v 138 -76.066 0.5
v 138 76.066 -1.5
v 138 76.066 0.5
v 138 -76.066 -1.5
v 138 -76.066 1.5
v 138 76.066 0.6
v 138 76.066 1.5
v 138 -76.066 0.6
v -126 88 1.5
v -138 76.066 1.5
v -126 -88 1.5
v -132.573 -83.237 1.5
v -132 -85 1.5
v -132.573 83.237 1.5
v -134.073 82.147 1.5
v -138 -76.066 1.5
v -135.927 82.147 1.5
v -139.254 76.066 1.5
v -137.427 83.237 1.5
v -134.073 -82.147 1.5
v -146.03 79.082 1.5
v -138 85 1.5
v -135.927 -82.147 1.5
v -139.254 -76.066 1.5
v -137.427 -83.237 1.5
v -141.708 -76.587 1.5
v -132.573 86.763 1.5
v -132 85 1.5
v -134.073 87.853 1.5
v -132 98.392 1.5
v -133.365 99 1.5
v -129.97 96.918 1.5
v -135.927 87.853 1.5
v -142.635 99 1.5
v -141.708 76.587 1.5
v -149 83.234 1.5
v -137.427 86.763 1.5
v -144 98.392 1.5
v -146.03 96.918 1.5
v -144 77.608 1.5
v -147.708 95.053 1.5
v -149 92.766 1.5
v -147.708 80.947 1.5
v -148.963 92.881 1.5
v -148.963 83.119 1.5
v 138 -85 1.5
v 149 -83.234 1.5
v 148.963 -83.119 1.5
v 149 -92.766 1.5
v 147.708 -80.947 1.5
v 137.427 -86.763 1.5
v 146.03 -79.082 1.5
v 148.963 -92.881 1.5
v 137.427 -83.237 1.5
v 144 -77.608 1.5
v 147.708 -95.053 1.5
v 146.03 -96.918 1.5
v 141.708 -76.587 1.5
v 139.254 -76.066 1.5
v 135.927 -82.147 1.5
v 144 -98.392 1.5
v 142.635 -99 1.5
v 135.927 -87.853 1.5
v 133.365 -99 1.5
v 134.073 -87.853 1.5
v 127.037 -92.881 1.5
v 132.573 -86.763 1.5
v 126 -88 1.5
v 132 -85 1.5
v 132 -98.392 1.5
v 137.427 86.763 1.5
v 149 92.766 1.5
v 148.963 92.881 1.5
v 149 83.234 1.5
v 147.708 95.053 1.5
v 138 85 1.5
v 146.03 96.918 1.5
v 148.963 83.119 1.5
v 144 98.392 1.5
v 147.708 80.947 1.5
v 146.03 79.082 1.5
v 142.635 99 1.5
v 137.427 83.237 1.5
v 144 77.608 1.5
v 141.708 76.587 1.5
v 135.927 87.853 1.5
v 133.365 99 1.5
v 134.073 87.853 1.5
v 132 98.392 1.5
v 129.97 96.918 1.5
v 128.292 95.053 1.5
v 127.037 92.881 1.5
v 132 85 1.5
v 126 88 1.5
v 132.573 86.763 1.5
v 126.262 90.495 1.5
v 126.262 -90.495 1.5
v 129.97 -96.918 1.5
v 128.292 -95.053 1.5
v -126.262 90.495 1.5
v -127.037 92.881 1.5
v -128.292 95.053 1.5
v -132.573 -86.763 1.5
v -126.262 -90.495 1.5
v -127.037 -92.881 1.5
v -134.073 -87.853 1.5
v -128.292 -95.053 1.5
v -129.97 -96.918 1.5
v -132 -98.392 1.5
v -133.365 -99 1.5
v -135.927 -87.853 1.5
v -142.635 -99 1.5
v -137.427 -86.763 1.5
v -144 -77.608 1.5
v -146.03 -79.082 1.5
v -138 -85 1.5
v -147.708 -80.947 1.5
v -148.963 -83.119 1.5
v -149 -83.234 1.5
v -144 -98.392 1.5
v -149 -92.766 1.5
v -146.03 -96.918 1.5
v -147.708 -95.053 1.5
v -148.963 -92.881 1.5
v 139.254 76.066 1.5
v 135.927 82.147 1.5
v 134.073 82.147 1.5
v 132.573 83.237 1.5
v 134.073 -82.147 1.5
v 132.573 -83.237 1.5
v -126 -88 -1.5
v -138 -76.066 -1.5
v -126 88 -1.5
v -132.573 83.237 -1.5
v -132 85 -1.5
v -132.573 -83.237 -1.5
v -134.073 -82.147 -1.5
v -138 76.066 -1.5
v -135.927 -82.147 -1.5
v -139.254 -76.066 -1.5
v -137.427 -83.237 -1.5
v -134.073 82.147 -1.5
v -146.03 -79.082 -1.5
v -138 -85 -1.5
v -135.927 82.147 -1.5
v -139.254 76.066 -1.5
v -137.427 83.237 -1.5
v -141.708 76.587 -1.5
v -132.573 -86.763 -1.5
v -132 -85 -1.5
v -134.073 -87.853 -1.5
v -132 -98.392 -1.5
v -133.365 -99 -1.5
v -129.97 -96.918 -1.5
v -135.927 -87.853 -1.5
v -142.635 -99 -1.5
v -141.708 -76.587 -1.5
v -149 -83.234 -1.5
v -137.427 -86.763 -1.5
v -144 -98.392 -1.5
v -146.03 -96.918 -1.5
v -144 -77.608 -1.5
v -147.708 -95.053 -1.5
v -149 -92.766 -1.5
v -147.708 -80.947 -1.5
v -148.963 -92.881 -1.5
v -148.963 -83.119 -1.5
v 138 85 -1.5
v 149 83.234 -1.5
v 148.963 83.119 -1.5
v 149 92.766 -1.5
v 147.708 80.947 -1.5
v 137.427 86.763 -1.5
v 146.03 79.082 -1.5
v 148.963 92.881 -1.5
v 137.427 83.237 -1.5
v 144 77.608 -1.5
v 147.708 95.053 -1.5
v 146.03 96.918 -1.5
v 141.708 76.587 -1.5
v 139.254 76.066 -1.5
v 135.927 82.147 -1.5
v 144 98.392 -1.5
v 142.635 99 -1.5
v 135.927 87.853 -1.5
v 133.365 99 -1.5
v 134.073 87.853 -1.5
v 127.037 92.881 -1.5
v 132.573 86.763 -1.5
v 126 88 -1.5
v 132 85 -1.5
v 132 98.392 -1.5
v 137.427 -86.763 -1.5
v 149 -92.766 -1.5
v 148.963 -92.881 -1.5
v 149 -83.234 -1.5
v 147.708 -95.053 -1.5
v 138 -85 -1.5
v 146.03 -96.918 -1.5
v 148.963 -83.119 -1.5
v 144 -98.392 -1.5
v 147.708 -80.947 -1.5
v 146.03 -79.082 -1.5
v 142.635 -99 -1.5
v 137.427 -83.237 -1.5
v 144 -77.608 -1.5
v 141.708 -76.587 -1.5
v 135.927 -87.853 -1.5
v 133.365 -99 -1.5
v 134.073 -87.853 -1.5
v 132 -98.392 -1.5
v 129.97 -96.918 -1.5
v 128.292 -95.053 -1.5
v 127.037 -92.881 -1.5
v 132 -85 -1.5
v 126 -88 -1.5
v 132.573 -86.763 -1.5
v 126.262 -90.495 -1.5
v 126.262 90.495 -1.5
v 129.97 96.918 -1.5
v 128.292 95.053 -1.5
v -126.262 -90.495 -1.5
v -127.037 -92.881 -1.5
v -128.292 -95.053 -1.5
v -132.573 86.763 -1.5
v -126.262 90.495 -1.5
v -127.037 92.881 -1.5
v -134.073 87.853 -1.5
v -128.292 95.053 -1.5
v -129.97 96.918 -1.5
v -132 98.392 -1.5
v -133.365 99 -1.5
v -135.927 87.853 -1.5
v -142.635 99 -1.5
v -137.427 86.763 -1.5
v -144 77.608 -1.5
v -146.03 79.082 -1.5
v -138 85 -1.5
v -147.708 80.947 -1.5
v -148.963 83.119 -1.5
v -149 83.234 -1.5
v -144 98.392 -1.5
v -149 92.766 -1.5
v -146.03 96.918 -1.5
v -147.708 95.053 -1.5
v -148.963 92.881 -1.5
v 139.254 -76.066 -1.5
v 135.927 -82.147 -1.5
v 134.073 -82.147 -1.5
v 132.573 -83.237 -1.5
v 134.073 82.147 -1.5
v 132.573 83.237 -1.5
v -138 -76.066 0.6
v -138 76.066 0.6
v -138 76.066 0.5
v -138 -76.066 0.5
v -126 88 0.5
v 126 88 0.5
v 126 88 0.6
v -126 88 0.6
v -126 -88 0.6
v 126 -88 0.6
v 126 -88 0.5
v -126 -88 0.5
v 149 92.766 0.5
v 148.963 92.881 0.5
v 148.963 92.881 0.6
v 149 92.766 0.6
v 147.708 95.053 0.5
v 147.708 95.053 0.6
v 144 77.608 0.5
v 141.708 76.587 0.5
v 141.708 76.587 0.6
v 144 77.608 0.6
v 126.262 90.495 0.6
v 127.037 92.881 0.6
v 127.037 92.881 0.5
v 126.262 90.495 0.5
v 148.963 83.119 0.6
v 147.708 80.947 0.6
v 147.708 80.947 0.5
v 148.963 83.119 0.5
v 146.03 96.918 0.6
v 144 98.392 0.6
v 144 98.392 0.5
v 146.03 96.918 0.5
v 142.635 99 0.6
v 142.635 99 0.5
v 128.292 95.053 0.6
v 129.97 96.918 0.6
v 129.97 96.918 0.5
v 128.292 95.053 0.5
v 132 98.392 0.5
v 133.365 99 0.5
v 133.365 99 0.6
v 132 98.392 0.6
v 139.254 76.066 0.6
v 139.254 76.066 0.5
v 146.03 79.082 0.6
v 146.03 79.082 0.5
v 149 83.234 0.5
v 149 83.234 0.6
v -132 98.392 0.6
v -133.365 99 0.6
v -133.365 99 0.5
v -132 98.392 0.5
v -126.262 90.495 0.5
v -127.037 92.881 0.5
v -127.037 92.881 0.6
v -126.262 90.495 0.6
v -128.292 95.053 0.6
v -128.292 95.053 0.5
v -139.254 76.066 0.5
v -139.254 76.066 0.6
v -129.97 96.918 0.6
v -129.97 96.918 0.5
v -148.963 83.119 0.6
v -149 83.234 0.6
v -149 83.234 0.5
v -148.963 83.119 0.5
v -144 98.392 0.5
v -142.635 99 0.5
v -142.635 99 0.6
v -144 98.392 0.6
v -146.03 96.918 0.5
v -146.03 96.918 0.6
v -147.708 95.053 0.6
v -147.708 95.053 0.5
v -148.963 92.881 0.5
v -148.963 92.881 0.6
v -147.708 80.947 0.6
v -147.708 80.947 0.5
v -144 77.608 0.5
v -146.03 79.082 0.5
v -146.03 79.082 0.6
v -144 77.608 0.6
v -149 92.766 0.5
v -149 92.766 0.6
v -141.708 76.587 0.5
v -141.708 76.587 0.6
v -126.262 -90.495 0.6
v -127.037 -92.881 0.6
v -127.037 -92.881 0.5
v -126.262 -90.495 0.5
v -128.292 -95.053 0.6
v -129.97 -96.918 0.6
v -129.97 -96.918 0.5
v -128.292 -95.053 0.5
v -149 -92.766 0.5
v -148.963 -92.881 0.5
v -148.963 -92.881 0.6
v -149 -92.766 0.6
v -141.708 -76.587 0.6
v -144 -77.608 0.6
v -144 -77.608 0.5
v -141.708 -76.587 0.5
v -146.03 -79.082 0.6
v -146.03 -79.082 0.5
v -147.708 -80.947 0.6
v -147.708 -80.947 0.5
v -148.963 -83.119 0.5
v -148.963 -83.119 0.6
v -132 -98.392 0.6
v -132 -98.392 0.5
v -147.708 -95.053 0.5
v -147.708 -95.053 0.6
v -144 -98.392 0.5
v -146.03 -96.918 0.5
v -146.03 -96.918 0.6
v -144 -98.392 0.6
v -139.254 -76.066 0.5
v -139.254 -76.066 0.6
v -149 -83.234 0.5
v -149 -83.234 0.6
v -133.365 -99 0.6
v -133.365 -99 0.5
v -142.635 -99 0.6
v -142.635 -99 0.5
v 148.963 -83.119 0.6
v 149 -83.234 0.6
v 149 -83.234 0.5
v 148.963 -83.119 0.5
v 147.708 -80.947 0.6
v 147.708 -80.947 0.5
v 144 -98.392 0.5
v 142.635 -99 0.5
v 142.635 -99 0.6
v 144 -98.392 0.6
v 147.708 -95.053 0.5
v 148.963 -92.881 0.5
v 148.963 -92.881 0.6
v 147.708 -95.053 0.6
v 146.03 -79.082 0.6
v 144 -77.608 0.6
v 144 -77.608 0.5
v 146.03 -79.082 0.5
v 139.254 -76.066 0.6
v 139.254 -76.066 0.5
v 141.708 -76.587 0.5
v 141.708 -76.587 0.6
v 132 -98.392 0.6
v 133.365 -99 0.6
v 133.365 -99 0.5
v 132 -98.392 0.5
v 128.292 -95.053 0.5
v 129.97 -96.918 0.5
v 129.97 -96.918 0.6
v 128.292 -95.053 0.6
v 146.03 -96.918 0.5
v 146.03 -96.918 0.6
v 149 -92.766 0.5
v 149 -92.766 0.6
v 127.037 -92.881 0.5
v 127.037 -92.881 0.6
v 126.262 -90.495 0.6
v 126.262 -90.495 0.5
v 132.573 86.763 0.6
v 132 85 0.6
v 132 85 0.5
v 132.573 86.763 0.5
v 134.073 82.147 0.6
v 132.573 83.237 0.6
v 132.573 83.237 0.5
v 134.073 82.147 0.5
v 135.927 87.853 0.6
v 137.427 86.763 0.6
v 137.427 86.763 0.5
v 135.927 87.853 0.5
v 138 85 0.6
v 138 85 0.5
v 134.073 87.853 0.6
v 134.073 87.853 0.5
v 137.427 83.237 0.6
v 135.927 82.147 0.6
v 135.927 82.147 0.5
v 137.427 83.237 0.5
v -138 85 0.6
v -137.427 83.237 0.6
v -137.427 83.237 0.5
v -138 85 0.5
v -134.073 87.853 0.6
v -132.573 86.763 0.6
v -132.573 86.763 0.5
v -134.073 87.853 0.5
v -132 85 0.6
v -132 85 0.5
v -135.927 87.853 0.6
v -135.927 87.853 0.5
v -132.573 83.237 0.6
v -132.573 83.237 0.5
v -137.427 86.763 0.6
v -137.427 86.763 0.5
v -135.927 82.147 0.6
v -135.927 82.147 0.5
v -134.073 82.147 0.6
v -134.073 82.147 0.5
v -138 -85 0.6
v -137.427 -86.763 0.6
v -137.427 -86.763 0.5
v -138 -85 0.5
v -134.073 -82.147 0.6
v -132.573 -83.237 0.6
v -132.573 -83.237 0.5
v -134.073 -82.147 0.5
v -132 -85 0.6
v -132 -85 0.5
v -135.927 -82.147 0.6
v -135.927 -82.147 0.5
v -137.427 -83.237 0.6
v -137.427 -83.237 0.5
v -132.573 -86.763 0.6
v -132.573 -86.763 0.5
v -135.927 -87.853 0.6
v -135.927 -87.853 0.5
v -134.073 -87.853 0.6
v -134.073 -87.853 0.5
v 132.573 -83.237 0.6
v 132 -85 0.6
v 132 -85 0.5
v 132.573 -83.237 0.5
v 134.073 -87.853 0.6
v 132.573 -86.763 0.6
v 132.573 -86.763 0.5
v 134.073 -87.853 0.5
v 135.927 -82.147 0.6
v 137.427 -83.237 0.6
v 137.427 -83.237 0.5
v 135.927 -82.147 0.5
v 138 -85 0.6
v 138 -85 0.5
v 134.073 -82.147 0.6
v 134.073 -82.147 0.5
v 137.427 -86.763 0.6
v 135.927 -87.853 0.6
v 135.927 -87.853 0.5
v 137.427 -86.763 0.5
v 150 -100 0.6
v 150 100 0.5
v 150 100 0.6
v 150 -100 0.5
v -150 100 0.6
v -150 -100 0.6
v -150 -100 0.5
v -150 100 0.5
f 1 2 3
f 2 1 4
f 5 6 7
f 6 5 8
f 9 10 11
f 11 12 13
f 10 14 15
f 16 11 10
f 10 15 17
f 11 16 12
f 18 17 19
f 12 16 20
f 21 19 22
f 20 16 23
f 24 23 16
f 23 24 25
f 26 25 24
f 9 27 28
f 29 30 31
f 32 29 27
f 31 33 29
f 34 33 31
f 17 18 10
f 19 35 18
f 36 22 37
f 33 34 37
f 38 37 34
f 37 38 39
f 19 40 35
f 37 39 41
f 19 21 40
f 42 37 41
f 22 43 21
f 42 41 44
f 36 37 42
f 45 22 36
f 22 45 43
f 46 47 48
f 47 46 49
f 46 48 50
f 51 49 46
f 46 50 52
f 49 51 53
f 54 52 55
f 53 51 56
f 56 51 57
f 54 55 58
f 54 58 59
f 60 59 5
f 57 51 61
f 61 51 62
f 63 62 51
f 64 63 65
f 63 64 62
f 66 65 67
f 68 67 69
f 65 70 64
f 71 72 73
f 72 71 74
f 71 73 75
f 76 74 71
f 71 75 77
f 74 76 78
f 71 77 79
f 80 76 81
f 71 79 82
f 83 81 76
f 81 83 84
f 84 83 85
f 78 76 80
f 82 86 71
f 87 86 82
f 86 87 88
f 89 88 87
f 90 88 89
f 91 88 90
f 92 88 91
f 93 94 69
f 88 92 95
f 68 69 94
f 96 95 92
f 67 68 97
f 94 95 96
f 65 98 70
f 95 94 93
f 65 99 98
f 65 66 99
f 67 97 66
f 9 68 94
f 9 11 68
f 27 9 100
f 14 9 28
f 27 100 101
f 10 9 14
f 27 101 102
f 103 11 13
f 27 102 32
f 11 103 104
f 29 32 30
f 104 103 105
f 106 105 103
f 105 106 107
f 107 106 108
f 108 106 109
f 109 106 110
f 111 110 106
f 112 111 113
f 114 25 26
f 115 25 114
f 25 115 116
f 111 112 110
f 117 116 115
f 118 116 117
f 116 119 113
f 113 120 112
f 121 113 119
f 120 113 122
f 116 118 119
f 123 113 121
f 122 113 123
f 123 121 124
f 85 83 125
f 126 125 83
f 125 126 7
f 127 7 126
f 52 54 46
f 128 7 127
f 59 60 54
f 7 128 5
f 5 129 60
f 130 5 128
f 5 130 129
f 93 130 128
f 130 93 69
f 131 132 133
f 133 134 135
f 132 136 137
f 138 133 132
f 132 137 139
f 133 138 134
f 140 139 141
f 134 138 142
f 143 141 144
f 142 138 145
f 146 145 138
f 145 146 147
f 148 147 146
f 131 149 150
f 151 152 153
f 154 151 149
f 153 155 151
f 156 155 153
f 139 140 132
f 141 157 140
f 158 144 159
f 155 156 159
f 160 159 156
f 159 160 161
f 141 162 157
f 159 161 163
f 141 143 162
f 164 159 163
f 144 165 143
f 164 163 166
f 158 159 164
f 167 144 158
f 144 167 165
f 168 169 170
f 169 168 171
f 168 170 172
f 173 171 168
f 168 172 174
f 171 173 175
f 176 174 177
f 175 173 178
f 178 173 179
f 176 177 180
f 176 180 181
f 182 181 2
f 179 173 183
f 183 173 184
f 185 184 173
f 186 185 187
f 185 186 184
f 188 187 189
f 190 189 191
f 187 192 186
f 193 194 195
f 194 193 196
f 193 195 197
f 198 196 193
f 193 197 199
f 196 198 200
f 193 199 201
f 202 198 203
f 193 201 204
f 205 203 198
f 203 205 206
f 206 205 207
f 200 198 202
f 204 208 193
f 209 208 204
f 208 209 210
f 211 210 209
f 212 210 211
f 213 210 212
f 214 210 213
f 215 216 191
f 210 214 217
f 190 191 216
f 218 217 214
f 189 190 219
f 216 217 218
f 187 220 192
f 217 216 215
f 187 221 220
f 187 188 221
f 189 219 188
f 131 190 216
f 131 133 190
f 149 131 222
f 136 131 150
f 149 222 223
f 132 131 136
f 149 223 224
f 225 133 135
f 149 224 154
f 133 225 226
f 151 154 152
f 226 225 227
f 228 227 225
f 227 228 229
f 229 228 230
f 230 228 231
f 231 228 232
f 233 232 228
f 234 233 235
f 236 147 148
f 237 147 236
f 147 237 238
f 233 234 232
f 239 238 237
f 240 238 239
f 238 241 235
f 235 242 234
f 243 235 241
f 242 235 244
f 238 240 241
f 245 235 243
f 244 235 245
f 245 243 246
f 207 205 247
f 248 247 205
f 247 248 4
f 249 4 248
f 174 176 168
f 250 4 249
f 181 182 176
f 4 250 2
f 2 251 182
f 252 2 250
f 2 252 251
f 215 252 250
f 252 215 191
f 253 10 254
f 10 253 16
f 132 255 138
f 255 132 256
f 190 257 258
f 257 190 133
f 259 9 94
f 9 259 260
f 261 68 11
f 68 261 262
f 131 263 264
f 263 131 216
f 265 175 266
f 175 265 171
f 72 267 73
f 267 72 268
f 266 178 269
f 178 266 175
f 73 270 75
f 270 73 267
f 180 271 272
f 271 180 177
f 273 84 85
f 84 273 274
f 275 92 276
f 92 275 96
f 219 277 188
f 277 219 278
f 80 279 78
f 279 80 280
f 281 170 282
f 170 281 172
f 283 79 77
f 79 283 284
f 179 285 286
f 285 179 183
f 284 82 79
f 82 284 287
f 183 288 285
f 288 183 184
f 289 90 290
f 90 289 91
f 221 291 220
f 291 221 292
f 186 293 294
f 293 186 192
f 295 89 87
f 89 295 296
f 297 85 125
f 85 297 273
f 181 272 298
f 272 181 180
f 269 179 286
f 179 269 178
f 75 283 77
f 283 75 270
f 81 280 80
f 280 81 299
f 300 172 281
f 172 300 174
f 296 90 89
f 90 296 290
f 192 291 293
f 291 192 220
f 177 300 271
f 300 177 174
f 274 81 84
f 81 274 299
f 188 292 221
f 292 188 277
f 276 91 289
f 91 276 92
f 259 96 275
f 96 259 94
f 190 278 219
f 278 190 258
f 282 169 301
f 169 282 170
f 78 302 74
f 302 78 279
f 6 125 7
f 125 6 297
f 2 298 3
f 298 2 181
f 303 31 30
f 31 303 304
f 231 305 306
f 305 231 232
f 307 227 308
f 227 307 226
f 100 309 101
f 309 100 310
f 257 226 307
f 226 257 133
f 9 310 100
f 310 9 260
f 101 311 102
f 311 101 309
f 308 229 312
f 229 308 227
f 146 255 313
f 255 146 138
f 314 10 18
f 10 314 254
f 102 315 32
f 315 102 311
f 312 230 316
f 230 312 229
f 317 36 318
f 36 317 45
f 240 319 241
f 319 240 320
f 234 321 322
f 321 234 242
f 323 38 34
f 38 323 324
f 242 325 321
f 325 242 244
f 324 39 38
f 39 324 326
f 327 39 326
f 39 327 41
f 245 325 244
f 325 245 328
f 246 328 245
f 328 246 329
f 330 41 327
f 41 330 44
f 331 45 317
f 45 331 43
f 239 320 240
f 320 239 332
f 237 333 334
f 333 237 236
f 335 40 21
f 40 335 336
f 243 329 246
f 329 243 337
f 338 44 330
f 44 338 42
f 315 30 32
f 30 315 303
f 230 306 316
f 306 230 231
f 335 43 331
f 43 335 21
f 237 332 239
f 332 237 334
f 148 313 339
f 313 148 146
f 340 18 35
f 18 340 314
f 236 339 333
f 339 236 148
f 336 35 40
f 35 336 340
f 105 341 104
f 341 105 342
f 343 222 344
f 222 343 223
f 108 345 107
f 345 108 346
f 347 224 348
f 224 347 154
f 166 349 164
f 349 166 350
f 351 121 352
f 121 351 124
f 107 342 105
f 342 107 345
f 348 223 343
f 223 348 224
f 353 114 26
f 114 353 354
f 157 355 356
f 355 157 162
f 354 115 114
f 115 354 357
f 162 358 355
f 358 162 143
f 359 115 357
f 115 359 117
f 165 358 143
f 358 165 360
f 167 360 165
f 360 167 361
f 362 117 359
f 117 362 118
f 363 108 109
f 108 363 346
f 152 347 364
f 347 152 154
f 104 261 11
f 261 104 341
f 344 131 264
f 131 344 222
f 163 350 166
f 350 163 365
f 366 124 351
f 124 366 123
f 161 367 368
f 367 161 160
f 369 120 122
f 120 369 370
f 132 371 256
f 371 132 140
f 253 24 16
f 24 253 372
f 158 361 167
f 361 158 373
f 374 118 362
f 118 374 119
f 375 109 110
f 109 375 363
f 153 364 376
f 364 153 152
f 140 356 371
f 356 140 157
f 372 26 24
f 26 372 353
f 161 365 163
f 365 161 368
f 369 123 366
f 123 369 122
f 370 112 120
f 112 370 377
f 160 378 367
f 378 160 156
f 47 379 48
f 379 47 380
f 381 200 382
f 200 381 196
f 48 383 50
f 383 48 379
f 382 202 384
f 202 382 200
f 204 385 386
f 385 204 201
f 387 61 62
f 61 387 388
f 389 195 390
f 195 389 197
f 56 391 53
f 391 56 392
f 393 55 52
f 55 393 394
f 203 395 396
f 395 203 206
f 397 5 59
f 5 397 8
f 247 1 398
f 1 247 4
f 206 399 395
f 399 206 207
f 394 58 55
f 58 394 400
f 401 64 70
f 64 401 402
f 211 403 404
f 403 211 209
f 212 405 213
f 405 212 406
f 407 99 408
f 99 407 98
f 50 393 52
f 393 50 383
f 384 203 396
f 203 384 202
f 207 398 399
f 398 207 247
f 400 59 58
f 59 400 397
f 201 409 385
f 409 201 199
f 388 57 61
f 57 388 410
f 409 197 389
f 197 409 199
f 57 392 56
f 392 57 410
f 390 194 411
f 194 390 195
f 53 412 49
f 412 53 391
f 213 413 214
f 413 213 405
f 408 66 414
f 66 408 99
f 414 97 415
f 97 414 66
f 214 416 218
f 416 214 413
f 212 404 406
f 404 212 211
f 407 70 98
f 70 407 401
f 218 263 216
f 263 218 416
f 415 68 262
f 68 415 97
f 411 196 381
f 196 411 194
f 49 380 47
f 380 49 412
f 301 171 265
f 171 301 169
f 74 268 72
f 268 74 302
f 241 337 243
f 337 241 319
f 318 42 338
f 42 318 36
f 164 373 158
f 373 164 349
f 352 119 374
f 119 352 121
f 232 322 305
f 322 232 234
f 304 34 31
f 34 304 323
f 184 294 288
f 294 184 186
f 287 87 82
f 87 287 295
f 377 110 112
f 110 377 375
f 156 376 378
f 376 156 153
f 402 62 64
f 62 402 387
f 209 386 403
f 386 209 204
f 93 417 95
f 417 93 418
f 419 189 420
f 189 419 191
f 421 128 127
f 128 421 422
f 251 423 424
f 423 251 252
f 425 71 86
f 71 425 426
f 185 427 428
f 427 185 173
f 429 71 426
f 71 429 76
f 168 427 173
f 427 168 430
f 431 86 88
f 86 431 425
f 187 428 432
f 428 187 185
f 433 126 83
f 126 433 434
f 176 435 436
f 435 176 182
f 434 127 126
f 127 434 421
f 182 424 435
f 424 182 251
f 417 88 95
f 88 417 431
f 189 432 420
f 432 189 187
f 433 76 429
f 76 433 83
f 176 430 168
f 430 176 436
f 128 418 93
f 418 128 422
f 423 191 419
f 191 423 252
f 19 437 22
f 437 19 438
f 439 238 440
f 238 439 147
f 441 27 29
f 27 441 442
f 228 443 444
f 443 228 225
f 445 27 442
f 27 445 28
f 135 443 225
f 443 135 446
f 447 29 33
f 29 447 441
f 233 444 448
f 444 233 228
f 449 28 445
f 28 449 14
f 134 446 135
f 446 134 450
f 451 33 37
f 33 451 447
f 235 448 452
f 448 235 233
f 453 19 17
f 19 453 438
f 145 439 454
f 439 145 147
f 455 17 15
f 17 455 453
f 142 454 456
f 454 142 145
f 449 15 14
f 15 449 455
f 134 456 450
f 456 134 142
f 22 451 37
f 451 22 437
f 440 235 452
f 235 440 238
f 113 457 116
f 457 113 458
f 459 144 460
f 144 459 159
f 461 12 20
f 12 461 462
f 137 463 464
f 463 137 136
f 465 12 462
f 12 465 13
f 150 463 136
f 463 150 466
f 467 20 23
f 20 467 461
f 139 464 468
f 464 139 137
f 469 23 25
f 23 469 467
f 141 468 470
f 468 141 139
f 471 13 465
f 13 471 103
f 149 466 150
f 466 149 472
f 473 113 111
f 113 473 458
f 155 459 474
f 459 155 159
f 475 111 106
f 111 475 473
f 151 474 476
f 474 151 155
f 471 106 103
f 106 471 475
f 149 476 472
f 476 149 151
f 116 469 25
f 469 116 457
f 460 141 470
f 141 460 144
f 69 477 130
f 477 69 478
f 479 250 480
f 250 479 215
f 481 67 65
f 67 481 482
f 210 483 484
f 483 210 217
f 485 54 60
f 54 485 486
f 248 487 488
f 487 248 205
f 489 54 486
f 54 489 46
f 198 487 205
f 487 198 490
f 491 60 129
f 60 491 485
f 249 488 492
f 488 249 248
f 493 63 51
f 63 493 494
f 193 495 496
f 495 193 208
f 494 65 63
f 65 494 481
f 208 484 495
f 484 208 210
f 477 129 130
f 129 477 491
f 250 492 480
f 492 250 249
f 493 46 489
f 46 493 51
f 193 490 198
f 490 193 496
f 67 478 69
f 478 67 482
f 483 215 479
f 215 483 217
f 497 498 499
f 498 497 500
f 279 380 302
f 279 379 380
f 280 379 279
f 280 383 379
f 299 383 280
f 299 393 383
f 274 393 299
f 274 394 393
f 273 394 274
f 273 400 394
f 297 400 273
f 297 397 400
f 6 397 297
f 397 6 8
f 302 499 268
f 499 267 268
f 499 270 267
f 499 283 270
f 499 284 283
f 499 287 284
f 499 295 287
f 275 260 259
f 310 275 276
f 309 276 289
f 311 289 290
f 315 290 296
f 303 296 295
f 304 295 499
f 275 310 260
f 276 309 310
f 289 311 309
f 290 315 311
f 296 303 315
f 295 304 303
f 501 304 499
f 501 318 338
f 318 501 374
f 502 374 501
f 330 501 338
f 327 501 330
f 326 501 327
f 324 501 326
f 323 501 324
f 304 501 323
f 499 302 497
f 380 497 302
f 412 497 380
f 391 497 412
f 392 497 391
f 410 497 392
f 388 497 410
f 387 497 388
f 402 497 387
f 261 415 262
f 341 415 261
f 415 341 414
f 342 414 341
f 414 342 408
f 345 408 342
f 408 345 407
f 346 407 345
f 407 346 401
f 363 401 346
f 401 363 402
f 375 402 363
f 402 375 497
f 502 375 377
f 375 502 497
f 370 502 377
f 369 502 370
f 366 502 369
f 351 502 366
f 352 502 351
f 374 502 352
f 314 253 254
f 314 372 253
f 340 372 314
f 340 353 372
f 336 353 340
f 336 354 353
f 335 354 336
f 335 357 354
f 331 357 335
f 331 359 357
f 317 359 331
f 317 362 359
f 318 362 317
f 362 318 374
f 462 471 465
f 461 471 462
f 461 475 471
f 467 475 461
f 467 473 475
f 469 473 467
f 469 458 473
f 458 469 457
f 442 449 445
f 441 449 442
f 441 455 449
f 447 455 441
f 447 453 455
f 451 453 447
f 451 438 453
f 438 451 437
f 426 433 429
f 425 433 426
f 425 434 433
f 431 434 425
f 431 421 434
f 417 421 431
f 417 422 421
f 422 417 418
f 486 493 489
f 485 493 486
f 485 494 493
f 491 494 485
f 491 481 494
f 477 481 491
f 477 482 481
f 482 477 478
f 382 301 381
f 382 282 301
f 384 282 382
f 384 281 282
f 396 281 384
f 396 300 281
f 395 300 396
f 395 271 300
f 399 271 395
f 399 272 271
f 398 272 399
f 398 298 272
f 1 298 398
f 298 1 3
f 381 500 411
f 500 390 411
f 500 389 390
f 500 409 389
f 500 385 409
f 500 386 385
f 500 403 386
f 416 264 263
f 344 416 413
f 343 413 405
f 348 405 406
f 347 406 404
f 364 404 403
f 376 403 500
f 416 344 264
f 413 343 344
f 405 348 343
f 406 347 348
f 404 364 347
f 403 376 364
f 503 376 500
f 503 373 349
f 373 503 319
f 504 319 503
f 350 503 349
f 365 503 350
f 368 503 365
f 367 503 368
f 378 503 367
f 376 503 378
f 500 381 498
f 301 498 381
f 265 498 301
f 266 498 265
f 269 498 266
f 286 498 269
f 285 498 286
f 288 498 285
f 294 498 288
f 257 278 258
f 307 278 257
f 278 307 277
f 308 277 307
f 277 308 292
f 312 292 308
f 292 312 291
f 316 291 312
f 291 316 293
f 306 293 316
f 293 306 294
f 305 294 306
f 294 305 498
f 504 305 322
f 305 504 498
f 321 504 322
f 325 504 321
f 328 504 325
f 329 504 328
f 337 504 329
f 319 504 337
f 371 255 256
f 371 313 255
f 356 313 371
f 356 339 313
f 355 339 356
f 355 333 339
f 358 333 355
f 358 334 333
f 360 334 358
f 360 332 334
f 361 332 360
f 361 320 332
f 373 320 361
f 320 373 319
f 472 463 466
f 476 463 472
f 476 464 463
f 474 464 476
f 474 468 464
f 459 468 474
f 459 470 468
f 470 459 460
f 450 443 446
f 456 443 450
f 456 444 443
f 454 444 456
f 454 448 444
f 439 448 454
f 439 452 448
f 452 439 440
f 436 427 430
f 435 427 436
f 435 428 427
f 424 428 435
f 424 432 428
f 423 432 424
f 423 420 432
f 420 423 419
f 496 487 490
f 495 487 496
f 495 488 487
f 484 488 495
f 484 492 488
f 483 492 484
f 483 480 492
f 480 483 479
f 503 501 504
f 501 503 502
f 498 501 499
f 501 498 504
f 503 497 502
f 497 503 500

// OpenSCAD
// Parameters
sheet_length = 300; //[150:600:1]
sheet_width = 200; //[100:400:1]
sheet_thickness = 3; //[1.5:6:0.1]
corner_radius = 12; //[6:24:0.5]
chamfer_size = 1; //[0.5:2:0.1]
hole_diameter = 6; //[3:12:0.5]
hole_edge_margin = 15; //[8:30:1]
film_thickness = 0.1; //[0.05:0.3:0.01]
overlap = 1; //[0.5:2:0.1]

// Base shapes
module acrylic_sheet_body() {
  cube([sheet_length, sheet_width, sheet_thickness], center=true);
}

module rounded_corners() {
  cube([sheet_length - 2*corner_radius, sheet_width - 2*corner_radius, sheet_thickness], center=true);
}

module corner_cylinder(x, y) {
  translate([x, y, 0])
    cylinder(r=corner_radius, h=sheet_thickness, center=true);
}

module edge_chamfer() {
  cube([sheet_length - 2*chamfer_size, sheet_width - 2*chamfer_size, sheet_thickness + 2*overlap], center=true);
}

module mounting_hole(x, y) {
  translate([x, y, 0])
    cylinder(r=hole_diameter/2, h=sheet_thickness + 2*overlap, center=true);
}

module protective_film_layer() {
  translate([0, 0, sheet_thickness/2 + film_thickness/2 - overlap])
    cube([sheet_length, sheet_width, film_thickness], center=true);
}

// Operations
module rounded_corners_union() {
  union() {
    rounded_corners();
    corner_cylinder(sheet_length/2 - corner_radius, sheet_width/2 - corner_radius);
    corner_cylinder(-sheet_length/2 + corner_radius, sheet_width/2 - corner_radius);
    corner_cylinder(-sheet_length/2 + corner_radius, -sheet_width/2 + corner_radius);
    corner_cylinder(sheet_length/2 - corner_radius, -sheet_width/2 + corner_radius);
  }
}

module sheet_with_rounded_corners() {
  intersection() {
    acrylic_sheet_body();
    rounded_corners_union();
  }
}

module sheet_chamfered() {
  intersection() {
    sheet_with_rounded_corners();
    edge_chamfer();
  }
}

module holes_union() {
  union() {
    mounting_hole(sheet_length/2 - hole_edge_margin, sheet_width/2 - hole_edge_margin);
    mounting_hole(-sheet_length/2 + hole_edge_margin, sheet_width/2 - hole_edge_margin);
    mounting_hole(-sheet_length/2 + hole_edge_margin, -sheet_width/2 + hole_edge_margin);
    mounting_hole(sheet_length/2 - hole_edge_margin, -sheet_width/2 + hole_edge_margin);
  }
}

module sheet_final_acrylic() {
  difference() {
    sheet_chamfered();
    holes_union();
  }
}

// Final model
module complete_model() {
  union() {
    color([0.85, 0.85, 0.8]) sheet_final_acrylic(); // Acrylic sheet
    color([0.9, 0.9, 0.9, 0.5]) protective_film_layer(); // Protective film
  }
}

// Render the complete model
complete_model();
